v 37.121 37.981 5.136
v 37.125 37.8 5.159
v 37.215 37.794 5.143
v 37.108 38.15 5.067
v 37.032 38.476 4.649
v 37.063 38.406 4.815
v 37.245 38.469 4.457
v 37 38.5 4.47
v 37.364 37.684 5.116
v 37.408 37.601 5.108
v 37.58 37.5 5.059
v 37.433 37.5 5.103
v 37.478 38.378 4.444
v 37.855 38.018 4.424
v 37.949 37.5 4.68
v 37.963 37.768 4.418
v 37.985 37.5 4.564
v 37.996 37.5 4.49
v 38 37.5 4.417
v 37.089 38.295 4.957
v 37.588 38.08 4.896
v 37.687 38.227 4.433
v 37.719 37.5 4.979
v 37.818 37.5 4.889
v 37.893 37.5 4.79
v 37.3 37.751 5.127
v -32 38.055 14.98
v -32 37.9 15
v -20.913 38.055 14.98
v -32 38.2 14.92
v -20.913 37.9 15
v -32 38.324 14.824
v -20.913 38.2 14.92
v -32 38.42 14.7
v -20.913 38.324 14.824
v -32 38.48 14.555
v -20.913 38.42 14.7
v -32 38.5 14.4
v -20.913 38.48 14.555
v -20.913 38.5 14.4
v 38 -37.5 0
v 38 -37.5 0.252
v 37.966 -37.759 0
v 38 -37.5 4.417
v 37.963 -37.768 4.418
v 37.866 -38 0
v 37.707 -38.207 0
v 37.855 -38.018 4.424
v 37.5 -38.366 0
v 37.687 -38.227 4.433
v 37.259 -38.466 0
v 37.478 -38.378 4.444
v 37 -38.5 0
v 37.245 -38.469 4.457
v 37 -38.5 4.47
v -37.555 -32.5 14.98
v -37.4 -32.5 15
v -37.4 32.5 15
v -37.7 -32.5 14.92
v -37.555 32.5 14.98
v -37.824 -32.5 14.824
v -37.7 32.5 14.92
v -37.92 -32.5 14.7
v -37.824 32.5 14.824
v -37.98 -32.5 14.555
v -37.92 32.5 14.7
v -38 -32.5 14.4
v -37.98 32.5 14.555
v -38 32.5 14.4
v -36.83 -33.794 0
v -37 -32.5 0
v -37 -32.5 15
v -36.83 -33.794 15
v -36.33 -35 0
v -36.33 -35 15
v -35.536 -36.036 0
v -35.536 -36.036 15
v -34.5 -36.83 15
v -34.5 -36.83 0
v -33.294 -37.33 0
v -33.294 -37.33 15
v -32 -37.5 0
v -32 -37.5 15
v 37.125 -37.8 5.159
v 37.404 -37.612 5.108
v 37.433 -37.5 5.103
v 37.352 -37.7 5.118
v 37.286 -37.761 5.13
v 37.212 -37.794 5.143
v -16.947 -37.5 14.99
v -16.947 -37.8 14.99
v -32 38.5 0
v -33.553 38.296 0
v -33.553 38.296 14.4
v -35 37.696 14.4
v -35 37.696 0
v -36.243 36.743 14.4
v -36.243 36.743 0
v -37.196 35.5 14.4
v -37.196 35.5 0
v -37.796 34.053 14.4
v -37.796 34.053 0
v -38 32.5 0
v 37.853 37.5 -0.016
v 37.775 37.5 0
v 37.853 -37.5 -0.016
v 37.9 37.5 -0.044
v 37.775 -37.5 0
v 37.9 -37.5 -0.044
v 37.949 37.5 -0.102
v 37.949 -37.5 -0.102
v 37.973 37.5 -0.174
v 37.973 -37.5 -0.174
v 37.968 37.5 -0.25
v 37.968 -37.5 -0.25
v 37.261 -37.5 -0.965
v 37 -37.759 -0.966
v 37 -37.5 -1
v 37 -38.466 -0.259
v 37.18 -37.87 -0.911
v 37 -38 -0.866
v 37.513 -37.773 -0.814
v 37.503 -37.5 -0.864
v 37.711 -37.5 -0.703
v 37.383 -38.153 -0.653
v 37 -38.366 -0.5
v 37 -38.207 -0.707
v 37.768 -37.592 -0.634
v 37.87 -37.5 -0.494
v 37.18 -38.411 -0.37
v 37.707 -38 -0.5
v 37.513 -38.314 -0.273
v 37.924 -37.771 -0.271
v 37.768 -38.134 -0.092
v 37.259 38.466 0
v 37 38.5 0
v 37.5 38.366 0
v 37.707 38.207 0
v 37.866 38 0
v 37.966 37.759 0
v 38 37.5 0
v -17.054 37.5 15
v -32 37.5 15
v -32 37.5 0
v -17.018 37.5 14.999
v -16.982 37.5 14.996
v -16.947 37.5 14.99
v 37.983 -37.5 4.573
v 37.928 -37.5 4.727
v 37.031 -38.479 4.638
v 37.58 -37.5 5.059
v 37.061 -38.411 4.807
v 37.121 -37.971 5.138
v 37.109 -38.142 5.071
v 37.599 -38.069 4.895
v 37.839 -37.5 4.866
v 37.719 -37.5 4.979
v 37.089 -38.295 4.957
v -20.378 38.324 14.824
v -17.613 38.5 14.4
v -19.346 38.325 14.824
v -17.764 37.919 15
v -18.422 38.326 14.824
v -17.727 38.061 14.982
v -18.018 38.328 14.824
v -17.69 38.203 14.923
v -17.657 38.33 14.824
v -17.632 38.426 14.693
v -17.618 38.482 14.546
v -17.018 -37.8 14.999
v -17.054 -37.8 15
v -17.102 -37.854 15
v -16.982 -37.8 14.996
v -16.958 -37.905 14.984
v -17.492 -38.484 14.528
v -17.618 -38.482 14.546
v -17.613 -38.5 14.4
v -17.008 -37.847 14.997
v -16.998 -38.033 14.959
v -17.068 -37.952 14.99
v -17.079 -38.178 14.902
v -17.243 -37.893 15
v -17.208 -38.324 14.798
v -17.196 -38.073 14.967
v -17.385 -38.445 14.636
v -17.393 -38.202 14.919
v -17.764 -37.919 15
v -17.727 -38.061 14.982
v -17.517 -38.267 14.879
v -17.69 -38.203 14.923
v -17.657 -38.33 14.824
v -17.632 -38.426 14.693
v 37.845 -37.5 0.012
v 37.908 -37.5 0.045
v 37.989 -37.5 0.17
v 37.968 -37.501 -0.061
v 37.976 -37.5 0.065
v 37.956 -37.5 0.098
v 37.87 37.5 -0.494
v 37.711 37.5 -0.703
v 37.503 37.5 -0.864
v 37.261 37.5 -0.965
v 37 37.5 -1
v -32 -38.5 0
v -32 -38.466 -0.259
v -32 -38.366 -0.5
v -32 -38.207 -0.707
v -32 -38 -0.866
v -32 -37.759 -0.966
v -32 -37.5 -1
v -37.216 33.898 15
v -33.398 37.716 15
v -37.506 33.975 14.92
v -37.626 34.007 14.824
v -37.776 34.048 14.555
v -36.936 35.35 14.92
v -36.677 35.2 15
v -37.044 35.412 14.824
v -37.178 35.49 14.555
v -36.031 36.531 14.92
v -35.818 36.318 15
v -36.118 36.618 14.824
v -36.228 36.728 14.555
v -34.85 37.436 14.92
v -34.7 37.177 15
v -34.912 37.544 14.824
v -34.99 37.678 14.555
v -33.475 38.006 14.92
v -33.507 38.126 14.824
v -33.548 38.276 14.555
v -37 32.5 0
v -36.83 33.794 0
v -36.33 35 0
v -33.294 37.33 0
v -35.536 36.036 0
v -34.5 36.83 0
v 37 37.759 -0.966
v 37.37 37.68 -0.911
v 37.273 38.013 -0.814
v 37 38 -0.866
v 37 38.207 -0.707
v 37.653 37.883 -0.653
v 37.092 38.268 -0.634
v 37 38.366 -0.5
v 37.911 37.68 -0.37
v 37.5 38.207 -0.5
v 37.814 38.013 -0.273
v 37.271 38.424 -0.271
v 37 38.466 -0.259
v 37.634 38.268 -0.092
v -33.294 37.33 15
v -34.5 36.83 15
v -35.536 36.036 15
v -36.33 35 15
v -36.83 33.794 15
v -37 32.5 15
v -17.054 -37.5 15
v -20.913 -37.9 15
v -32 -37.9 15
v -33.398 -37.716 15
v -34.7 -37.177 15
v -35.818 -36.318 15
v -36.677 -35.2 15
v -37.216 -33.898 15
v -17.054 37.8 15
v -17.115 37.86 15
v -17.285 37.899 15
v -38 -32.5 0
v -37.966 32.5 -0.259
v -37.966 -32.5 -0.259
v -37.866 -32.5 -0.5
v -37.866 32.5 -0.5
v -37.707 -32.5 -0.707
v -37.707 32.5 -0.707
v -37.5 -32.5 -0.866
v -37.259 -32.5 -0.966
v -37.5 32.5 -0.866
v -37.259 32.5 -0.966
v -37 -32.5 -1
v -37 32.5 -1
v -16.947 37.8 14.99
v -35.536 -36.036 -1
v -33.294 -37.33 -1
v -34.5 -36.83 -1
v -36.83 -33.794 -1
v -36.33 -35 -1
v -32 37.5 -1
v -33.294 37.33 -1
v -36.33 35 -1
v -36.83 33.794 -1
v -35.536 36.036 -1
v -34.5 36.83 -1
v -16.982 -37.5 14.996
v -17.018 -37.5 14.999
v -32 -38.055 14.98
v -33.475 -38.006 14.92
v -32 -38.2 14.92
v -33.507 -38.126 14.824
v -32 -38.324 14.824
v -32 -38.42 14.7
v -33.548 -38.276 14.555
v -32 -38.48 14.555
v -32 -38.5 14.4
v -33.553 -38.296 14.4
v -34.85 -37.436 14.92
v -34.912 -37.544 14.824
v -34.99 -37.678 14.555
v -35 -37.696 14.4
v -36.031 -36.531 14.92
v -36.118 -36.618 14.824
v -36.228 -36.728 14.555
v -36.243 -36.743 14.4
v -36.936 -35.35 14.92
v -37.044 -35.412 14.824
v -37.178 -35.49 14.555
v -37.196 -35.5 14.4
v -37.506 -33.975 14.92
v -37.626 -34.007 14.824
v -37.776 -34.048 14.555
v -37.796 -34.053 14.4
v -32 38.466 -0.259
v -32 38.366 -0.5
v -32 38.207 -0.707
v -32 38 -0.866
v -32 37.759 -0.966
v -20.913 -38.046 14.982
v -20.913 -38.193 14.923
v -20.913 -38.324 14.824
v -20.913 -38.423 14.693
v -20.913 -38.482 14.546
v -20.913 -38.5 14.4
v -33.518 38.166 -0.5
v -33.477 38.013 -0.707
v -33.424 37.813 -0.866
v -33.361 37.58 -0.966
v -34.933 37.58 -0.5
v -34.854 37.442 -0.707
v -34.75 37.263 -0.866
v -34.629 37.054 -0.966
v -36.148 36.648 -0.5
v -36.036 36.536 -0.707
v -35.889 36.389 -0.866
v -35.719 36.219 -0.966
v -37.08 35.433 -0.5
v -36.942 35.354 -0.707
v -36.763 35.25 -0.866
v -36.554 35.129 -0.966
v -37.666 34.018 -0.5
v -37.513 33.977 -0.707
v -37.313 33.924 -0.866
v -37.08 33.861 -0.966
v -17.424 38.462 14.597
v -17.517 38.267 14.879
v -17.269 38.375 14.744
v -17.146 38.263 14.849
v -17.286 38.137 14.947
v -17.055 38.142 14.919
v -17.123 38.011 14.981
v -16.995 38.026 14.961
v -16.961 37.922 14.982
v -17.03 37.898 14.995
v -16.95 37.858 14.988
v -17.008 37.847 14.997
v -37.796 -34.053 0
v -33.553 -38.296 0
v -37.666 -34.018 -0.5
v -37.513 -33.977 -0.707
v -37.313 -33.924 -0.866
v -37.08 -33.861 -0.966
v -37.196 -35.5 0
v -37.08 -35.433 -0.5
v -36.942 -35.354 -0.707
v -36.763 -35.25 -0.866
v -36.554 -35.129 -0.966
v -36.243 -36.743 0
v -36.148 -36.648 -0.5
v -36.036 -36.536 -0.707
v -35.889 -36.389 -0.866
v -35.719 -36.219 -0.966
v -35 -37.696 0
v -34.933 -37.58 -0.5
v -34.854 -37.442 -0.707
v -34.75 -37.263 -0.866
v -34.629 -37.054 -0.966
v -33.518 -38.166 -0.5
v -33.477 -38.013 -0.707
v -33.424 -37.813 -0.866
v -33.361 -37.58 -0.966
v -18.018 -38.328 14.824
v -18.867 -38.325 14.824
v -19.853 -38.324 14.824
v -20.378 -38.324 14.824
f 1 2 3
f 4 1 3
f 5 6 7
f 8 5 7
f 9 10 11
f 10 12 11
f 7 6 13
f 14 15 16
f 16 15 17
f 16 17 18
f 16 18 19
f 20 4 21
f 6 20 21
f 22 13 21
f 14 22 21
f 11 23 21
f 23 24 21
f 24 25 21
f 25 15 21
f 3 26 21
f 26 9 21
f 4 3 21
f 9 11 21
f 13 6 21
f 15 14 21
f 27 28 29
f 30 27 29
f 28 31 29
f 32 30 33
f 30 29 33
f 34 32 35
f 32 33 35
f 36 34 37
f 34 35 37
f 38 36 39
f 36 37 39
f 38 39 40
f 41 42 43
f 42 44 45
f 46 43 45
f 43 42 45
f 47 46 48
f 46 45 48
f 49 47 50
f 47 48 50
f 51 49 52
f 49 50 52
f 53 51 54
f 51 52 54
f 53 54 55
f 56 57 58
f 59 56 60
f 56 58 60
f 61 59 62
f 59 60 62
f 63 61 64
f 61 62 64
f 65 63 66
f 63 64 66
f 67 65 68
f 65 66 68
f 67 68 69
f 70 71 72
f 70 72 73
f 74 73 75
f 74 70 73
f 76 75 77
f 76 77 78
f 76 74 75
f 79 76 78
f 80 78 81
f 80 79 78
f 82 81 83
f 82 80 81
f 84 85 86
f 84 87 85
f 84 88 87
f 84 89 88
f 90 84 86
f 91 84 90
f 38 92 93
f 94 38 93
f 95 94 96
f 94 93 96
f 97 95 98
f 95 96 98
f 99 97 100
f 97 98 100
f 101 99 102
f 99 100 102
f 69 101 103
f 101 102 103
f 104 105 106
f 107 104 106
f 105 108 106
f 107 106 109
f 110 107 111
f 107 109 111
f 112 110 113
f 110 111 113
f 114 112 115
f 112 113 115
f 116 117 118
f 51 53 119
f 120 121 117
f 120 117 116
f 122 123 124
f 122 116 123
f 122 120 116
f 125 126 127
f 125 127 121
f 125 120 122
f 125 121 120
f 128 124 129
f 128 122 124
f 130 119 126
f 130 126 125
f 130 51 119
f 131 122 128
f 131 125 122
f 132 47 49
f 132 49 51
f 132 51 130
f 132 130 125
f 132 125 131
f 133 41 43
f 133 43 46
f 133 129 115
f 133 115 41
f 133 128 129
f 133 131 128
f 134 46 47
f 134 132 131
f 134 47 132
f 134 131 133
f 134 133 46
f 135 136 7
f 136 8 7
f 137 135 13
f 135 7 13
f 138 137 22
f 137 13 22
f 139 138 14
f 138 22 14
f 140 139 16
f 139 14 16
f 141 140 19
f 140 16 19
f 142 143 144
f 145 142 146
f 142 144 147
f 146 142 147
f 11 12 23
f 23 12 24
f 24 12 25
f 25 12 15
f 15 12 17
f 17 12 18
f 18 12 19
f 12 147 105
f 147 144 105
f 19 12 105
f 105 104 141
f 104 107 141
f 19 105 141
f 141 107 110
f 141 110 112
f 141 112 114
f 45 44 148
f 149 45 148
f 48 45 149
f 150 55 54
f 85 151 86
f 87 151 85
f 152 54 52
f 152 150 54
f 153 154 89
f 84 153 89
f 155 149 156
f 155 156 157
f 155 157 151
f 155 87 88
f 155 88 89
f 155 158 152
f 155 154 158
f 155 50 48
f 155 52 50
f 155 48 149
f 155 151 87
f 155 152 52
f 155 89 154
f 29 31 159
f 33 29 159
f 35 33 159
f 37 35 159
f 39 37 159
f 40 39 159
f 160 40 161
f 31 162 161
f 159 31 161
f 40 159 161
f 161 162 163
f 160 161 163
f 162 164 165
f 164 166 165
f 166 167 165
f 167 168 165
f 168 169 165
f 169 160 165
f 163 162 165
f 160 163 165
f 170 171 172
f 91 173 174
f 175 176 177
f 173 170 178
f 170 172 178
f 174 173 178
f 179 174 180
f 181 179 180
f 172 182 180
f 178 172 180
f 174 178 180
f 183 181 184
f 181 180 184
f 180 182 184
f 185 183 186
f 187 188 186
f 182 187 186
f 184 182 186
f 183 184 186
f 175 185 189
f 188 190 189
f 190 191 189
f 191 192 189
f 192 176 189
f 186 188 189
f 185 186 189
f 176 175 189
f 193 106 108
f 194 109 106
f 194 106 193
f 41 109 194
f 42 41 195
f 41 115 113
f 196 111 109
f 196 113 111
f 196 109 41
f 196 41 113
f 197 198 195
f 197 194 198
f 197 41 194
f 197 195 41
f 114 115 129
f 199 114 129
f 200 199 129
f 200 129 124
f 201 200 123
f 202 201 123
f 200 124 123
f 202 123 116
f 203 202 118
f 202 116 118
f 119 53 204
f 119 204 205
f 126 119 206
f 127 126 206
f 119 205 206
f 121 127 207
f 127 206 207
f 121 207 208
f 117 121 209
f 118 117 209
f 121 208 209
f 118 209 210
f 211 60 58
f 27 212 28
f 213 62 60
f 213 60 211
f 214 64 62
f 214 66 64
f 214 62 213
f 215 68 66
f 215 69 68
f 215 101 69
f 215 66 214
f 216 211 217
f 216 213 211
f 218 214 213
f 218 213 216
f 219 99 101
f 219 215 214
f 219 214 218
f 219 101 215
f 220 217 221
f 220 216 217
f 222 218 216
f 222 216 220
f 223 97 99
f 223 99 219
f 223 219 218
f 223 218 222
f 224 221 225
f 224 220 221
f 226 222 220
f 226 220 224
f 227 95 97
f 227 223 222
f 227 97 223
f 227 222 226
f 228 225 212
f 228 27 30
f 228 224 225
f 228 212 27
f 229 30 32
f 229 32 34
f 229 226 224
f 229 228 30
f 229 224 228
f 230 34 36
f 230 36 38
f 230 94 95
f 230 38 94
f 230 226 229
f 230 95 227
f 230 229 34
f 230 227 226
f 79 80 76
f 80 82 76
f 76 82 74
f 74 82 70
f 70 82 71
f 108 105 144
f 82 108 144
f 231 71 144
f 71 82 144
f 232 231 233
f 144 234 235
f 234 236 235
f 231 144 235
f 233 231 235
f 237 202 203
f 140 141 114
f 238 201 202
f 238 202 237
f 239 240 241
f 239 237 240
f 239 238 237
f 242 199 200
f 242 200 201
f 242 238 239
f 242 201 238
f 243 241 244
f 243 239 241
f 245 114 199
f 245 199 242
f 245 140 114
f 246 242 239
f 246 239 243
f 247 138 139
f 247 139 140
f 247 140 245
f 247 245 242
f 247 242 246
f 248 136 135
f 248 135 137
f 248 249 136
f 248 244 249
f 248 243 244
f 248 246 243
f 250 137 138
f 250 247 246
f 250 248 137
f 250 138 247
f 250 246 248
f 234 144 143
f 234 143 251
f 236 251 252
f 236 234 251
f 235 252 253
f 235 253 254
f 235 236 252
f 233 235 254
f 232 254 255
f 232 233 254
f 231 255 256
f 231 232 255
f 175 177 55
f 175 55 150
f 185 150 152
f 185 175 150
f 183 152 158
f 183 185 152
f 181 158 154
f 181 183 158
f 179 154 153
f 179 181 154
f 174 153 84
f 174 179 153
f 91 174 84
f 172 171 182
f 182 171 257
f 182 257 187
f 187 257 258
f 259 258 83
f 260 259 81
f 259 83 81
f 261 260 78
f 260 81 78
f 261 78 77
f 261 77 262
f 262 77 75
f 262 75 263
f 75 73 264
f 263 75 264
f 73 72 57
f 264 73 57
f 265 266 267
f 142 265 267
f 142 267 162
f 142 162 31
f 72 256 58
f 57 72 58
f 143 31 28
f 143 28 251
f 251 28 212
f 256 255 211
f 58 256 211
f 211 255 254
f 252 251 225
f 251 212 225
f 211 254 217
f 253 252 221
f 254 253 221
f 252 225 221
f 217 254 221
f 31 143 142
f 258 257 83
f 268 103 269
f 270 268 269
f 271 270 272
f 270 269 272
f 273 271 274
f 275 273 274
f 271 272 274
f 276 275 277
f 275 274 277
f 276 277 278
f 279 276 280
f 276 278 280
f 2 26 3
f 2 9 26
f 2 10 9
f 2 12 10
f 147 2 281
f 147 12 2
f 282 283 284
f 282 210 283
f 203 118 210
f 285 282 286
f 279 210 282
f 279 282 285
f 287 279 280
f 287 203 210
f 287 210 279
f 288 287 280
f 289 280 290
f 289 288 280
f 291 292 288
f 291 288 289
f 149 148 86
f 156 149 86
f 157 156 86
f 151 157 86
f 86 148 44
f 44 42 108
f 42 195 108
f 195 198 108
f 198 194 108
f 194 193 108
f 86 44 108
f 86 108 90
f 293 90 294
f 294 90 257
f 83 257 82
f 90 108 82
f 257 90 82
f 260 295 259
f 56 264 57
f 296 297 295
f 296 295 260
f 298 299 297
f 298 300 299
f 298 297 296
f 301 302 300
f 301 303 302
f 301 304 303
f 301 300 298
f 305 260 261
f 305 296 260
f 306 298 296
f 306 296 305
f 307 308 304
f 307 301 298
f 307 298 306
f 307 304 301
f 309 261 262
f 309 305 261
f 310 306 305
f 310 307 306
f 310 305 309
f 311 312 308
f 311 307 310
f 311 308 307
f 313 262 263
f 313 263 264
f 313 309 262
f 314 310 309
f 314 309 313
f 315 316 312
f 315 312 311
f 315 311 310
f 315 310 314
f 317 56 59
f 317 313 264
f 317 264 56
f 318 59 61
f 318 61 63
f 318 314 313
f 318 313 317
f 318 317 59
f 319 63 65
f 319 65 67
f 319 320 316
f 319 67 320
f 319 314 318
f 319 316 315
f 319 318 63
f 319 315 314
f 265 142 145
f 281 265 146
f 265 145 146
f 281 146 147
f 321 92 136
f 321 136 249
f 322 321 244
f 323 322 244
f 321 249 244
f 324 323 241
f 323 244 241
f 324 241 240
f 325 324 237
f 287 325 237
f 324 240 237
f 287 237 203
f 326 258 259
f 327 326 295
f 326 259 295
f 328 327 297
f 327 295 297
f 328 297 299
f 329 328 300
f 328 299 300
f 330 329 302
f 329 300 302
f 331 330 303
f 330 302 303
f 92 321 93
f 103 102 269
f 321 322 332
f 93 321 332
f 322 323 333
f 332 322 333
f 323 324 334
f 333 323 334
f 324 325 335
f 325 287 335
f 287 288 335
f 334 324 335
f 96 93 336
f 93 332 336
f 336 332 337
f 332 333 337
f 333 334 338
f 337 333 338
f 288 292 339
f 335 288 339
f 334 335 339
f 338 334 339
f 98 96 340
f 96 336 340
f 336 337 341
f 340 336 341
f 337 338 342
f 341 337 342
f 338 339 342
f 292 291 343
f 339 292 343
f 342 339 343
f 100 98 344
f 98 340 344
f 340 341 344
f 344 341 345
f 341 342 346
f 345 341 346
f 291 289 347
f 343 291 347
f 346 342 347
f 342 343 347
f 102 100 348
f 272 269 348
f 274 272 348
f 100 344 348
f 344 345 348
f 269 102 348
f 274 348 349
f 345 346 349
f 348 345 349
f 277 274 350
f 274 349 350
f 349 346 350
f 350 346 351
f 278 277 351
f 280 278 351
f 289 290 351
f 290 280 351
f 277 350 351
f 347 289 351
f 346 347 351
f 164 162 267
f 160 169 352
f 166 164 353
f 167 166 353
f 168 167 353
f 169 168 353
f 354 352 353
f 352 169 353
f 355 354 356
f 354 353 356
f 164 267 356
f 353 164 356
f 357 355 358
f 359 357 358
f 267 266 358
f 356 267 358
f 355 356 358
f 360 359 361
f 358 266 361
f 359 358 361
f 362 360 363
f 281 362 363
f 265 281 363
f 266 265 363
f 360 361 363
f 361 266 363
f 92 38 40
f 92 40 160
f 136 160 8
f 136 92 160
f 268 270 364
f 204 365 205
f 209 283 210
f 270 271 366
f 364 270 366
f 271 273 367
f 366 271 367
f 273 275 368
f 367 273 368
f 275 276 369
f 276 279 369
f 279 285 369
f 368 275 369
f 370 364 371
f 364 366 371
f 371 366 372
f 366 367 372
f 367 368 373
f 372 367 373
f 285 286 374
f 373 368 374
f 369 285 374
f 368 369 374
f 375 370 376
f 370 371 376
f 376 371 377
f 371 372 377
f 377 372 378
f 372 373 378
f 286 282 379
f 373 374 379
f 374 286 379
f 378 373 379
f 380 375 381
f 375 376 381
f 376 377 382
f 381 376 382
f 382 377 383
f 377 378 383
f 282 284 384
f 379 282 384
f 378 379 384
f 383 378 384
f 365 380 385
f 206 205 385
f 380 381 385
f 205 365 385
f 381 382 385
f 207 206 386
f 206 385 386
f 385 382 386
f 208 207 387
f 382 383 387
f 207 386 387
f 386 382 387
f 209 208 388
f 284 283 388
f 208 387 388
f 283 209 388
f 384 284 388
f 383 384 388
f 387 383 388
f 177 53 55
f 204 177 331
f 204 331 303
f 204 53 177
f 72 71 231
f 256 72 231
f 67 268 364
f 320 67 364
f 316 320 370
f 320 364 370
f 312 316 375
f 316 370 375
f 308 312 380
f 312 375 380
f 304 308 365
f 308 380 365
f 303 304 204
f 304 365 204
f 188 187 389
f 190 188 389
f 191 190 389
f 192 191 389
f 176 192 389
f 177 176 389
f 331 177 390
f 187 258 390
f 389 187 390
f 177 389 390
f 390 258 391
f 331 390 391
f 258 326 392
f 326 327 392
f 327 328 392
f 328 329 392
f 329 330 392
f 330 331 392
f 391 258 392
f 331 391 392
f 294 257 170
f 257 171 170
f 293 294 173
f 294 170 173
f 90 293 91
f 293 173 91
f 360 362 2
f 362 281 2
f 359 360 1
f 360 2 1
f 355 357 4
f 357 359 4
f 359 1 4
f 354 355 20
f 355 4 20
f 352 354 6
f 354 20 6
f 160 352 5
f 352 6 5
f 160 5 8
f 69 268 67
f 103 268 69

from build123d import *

# Parameters (mm, degrees)
PAD_DEPTH       = 15
THICKNESS_T     = 1
SKETCH001_W     = 75
SKETCH001_H     = 15
POCKET_DEPTH    = 5
POCKET001_DEPTH = 77.001
FILLET_R        = 0.7
FILLET001_R     = 0.6
FILLET002_R     = 0.2


with BuildPart() as part:
    # Sketch → Pad (new body)
    with BuildSketch(Plane.XY):
        with BuildLine():
            Line((-32, 37.5), (37, 37.5))
            Line((37, 37.5), (37, -37.5))
            Line((37, -37.5), (-32, -37.5))
            ThreePointArc((-37, -32.5), (-35.535534, -36.035534), (-32, -37.5))
            Line((-37, -32.5), (-37, 32.5))
            ThreePointArc((-32, 37.5), (-35.535534, 36.035534), (-37, 32.5))
        make_face()
    extrude(amount=PAD_DEPTH)

    # Thickness
    thickness_openings = [part.faces().sort_by_distance(p)[0] for p in [
        (0.069509, 0, 15),
    ]]
    offset(amount=THICKNESS_T, openings=thickness_openings)

    # Sketch001 (on Face11 of Thickness) → Pocket (cut)
    with BuildSketch(Plane.YZ.offset(38)):
        with Locations((0, 7.5)):
            Rectangle(SKETCH001_W, SKETCH001_H)
    extrude(amount=-POCKET_DEPTH, mode=Mode.SUBTRACT)

    # Sketch002 (on Face14 of Pocket) → Pocket001 (cut, through all)
    with BuildSketch(Plane.XZ.offset(38.5)):
        Polygon((-17, 15), (38, 15), (38, 5), align=None)
    extrude(amount=-POCKET001_DEPTH, mode=Mode.SUBTRACT)

    # Fillet
    fillet_edges = [part.edges().sort_by_distance(p)[0] for p in [
        (10, -38.5, 10.090909),
        (10, 38.5, 10.090909),
    ]]
    fillet(fillet_edges, radius=FILLET_R)

    # Fillet001
    fillet001_edges = [part.edges().sort_by_distance(p)[0] for p in [
        (-38, 0, 15),
    ]]
    fillet(fillet001_edges, radius=FILLET001_R)

    # Fillet002
    fillet002_edges = [part.edges().sort_by_distance(p)[0] for p in [
        (38, 0, 0),
    ]]
    fillet(fillet002_edges, radius=FILLET002_R)


solid = part.part
